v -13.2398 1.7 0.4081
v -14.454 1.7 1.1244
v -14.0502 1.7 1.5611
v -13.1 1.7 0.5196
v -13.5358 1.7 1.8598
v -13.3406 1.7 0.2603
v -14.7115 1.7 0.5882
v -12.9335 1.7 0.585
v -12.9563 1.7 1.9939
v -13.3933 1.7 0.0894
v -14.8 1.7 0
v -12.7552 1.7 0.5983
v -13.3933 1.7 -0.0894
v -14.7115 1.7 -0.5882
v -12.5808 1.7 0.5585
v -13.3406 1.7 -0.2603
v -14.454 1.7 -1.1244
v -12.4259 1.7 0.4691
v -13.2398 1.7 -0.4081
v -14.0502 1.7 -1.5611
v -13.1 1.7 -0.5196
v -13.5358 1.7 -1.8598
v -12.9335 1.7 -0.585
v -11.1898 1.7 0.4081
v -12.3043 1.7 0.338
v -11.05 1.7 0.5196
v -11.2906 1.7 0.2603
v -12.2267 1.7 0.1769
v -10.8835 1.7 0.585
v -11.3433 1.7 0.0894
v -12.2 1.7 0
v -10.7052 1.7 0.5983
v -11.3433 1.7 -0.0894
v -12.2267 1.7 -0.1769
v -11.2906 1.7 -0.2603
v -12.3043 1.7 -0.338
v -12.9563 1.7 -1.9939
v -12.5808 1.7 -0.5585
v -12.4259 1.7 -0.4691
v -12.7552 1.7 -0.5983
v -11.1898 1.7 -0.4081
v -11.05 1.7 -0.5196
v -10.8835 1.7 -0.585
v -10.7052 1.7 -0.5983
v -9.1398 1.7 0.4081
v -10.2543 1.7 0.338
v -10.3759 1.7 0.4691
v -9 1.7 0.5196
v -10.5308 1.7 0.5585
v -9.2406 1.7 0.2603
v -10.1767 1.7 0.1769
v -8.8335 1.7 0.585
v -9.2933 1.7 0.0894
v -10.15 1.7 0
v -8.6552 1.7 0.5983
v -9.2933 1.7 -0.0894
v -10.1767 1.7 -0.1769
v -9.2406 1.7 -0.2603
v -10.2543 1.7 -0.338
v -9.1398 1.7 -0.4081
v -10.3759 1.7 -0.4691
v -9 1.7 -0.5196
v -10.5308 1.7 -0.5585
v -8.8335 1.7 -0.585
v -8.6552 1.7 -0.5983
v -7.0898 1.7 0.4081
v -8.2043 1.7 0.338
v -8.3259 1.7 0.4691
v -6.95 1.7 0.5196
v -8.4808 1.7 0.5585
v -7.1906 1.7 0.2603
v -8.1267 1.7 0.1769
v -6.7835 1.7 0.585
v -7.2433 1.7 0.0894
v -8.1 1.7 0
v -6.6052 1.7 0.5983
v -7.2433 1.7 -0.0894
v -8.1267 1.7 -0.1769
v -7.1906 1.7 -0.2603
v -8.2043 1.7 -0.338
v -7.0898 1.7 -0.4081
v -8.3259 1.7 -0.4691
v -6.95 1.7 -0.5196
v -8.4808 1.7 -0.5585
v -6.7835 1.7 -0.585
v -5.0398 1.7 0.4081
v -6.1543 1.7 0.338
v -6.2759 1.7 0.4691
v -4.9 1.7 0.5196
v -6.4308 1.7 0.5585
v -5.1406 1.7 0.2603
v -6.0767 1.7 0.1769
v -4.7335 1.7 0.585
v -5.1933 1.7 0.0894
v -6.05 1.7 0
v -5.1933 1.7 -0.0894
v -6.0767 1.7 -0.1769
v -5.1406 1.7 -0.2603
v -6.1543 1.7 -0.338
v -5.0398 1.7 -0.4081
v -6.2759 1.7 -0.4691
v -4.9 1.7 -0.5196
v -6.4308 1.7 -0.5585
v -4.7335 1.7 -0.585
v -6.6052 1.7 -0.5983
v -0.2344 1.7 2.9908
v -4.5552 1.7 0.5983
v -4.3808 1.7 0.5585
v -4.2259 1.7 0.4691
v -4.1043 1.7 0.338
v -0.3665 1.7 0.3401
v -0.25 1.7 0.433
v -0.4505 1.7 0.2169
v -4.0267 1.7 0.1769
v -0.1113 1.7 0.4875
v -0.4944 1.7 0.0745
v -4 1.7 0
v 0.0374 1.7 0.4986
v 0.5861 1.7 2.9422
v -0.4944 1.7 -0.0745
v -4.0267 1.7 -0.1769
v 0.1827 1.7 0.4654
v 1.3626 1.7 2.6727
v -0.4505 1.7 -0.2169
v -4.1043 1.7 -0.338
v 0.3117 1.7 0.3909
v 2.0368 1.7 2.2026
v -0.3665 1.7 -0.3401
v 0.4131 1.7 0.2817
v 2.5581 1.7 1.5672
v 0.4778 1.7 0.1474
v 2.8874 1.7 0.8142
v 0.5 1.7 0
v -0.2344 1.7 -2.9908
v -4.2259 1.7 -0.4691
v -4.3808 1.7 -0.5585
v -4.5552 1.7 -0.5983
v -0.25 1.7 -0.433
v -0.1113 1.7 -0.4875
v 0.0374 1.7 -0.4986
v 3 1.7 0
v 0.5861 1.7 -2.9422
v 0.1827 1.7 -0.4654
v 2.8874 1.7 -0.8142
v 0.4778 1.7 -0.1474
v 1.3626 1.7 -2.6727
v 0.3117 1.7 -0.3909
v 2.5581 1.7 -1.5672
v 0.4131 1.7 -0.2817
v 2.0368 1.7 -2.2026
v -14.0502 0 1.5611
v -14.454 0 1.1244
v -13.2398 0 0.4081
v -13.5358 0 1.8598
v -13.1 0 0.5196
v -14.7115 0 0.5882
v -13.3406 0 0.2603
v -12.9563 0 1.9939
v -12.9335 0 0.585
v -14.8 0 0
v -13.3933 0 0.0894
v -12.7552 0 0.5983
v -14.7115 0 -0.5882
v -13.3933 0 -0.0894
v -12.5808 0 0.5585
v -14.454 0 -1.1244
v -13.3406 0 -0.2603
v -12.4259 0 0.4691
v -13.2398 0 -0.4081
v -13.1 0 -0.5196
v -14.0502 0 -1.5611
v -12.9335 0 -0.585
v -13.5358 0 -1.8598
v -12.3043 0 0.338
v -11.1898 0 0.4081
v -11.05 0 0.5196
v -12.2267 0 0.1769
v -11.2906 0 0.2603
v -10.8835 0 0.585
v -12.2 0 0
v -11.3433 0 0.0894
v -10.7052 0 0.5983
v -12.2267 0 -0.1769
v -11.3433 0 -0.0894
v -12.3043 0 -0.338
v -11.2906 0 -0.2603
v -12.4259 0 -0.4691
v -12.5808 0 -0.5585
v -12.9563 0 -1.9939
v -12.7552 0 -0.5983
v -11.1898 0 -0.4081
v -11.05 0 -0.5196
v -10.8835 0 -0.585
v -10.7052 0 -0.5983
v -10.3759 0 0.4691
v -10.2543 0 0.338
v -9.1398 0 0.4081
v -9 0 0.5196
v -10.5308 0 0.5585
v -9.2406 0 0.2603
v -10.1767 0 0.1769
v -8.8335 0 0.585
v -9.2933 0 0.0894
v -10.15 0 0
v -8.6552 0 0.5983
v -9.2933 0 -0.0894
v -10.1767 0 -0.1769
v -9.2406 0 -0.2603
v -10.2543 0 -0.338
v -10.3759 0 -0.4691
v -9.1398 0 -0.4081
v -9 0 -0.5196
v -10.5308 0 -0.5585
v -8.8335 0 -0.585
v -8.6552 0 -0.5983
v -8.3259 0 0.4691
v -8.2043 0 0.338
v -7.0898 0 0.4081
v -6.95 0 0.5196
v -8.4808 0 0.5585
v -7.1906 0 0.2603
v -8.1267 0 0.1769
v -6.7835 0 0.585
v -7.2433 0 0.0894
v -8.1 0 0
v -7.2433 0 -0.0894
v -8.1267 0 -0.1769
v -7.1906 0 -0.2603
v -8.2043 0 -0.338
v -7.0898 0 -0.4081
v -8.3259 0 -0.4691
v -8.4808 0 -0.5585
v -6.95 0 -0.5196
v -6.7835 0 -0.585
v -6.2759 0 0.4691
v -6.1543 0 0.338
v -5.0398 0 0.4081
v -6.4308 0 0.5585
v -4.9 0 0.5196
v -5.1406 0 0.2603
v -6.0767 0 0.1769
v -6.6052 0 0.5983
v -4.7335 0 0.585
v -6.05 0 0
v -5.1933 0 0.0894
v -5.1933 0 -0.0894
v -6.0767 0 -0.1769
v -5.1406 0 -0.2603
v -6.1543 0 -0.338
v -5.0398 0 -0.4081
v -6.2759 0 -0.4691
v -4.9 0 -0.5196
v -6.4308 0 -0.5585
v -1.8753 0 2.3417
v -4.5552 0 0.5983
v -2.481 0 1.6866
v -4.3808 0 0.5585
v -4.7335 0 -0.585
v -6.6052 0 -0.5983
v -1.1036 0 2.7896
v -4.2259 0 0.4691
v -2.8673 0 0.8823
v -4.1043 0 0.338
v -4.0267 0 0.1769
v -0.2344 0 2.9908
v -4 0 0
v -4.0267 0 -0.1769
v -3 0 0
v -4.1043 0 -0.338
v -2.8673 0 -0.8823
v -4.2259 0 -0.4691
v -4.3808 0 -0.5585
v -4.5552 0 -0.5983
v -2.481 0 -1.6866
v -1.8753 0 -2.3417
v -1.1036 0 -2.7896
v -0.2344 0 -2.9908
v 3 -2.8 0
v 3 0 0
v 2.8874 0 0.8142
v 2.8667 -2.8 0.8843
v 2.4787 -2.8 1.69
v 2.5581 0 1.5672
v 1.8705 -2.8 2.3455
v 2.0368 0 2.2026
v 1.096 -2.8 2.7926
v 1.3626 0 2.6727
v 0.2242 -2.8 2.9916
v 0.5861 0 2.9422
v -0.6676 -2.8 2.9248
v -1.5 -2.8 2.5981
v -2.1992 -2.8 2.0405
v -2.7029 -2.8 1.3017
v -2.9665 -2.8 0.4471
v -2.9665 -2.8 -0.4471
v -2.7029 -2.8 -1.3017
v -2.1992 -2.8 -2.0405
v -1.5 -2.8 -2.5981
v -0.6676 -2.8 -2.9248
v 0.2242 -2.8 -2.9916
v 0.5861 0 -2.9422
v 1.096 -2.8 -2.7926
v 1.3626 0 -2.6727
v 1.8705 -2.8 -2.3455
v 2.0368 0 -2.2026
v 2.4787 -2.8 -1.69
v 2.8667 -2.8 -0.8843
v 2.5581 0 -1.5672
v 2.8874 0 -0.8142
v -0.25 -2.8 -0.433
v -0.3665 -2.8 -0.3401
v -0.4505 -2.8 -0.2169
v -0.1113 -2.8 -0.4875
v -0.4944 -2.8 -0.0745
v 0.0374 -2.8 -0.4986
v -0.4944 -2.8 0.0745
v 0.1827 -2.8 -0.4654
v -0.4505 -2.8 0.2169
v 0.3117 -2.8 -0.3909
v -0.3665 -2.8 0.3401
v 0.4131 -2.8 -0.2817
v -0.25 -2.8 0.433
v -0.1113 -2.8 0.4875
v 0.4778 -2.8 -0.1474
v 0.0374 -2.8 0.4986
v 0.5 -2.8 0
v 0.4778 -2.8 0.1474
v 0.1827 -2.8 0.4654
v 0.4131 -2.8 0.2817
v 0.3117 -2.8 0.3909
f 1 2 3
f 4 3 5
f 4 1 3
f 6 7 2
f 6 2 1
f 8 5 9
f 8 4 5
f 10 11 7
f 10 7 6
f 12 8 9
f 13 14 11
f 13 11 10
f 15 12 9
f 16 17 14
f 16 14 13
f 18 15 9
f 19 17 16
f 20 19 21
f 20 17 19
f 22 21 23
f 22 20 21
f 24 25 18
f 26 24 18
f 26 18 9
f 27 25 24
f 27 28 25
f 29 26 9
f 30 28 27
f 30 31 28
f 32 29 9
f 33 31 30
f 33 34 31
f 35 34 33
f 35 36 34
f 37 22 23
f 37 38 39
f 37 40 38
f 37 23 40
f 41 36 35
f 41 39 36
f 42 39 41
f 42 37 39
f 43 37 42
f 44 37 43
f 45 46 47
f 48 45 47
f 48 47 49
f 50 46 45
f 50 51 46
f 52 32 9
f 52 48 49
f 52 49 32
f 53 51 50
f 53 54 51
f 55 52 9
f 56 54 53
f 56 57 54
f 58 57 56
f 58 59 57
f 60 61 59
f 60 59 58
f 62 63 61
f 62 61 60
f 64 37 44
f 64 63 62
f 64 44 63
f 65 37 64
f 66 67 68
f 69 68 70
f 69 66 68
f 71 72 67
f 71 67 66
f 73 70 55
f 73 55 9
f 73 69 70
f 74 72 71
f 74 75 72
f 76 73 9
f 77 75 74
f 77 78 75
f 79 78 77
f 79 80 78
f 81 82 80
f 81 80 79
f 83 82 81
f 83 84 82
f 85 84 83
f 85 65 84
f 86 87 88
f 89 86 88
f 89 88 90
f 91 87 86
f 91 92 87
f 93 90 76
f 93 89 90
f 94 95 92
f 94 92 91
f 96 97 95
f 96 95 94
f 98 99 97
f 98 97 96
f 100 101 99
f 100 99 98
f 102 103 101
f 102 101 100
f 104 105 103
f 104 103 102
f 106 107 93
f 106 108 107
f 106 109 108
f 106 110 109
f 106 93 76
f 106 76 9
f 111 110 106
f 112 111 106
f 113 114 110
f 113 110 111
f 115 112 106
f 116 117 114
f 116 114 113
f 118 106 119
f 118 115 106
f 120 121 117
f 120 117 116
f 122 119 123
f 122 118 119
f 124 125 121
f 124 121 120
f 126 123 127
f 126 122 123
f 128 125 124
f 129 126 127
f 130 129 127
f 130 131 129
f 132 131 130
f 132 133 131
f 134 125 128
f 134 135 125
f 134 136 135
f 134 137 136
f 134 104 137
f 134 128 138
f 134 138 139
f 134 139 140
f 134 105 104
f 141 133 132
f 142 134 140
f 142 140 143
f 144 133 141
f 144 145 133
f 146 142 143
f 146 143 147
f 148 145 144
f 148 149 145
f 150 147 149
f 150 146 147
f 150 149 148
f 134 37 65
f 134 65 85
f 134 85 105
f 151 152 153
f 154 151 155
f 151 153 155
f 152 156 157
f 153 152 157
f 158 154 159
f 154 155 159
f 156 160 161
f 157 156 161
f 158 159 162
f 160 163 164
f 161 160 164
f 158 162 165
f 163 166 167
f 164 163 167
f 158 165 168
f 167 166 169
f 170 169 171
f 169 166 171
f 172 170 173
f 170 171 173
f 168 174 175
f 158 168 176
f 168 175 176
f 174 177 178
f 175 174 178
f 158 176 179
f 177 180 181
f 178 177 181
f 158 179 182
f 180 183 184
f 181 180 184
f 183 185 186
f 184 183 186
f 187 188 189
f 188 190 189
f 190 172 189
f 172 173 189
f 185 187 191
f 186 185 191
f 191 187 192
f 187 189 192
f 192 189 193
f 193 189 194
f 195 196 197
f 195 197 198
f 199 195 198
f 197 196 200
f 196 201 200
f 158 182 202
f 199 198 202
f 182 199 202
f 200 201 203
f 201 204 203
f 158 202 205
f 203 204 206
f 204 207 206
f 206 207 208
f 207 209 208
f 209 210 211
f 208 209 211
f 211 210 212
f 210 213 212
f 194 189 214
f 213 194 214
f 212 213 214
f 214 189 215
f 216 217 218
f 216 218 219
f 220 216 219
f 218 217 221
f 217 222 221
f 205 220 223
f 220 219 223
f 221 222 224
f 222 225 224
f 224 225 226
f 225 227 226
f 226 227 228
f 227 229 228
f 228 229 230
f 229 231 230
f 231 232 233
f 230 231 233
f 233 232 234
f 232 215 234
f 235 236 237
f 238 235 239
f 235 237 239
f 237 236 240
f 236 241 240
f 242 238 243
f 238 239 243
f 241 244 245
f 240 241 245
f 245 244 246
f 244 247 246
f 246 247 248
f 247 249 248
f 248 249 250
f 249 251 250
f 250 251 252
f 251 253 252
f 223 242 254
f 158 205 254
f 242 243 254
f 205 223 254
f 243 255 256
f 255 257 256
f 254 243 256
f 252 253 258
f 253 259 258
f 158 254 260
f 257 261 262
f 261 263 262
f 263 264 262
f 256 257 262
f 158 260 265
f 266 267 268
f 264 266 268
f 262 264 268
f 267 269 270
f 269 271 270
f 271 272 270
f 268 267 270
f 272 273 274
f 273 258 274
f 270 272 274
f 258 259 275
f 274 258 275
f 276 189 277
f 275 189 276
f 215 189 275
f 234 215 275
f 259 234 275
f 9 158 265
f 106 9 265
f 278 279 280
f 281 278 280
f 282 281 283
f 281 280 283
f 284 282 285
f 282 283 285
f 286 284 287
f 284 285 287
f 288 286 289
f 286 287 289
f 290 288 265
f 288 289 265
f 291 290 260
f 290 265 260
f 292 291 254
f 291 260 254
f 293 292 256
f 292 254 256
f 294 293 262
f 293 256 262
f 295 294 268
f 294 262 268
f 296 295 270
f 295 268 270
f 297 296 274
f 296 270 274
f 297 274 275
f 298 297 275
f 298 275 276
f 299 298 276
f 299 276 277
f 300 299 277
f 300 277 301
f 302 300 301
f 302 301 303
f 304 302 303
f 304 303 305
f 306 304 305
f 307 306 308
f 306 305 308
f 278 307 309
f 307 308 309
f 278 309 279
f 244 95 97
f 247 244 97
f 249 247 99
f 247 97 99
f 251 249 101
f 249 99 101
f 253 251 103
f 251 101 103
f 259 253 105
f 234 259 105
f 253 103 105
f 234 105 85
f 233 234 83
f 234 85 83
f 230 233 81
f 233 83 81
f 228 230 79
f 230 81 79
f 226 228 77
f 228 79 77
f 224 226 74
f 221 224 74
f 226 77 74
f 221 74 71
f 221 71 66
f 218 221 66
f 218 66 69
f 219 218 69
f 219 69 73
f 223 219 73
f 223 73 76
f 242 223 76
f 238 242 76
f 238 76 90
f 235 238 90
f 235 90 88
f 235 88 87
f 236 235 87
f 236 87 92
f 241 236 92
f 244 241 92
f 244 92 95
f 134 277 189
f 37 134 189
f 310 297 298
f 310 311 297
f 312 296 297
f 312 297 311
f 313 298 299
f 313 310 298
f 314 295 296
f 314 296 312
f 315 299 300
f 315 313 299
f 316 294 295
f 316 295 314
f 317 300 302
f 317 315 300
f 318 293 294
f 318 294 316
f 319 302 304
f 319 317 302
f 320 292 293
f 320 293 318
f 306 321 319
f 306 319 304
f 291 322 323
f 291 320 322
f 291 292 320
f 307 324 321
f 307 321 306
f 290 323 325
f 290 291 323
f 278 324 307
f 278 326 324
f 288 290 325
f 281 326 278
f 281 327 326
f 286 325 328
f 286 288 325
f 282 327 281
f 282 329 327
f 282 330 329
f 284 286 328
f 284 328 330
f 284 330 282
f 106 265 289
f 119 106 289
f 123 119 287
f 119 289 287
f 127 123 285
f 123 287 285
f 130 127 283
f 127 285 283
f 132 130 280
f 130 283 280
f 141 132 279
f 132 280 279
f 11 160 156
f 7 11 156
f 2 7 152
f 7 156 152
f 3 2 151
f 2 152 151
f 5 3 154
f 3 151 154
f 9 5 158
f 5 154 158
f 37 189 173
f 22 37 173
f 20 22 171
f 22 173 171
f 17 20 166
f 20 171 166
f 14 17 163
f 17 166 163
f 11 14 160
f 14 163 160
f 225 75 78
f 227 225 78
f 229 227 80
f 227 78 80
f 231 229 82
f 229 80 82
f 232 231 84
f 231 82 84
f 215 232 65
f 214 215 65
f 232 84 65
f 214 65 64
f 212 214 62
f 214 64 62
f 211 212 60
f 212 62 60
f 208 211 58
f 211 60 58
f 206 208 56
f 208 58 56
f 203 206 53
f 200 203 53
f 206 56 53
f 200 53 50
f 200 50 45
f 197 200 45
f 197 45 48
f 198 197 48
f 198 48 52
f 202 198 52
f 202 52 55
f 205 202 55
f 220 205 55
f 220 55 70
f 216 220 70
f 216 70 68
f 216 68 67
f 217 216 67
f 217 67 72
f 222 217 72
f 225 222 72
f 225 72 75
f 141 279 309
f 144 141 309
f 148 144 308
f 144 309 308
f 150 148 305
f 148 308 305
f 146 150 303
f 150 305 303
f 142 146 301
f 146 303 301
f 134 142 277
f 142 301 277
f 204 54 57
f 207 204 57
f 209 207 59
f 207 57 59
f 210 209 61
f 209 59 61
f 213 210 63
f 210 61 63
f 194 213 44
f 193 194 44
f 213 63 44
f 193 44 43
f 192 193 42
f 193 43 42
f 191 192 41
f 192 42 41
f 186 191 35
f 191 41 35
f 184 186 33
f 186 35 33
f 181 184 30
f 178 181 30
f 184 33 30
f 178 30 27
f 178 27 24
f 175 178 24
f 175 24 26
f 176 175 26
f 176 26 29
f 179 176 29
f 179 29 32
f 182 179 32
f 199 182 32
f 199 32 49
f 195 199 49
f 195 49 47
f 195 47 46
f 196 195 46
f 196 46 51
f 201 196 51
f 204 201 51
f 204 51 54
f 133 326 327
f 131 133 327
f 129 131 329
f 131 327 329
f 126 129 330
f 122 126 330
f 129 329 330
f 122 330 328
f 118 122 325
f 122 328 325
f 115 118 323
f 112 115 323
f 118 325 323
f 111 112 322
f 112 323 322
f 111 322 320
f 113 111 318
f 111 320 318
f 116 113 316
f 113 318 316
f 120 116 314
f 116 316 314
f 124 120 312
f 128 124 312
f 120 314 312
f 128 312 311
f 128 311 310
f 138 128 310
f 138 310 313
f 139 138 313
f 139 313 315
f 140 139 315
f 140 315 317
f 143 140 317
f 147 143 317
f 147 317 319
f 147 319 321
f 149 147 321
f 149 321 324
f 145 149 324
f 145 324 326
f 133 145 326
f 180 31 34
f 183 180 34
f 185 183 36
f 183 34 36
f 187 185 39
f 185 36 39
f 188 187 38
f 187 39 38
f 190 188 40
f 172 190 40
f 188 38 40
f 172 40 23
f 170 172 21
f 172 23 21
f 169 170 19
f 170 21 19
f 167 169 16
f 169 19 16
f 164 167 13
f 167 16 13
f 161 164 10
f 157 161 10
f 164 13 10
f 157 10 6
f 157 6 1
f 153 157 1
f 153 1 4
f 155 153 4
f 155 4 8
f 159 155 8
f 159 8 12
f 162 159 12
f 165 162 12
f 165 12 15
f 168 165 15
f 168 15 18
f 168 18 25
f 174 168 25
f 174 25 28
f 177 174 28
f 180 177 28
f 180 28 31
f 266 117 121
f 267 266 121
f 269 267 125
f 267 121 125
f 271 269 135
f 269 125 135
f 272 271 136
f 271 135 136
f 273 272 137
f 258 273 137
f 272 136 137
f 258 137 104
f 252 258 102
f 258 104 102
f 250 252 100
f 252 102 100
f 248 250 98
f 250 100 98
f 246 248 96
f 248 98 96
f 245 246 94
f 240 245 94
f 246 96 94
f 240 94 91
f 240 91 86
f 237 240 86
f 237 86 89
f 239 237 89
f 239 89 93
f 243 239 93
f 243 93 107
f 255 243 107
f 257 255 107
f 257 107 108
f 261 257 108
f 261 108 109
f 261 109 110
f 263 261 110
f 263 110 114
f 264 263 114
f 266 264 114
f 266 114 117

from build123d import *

# Parameters (mm, degrees)
BOSS_EXTRUDE1_DEPTH = 1.7
SKETCH2_R           = 0.6
CUT_EXTRUDE1_DEPTH  = 2.7
SKETCH3_R           = 3
BOSS_EXTRUDE2_DEPTH = 2.8
SKETCH4_R           = 0.5
CUT_EXTRUDE2_DEPTH  = 5.5


with BuildPart() as part:
    # Sketch1 → Boss-Extrude1 (new body)
    with BuildSketch(Plane(origin=(0, 0, 0), x_dir=(1, 0, 0), z_dir=(0, 1, 0))):
        with BuildLine():
            Line((-3, 0), (-10.8, 0))
            ThreePointArc((-10.8, 0), (-11.442152439, -1.468417516), (-12.95625, -1.993887143))
            Line((-12.95625, -1.993887143), (-0.234375, -2.990830714))
            ThreePointArc((-0.234375, -2.990830714), (-2.202626273, -2.036771342), (-3, 0))
        make_face()
        with BuildLine():
            ThreePointArc((-12.95625, 1.993887143), (-14.268417516, 1.357847561), (-14.8, 0))
            Line((-14.8, 0), (-10.8, 0))
            ThreePointArc((-10.8, 0), (-11.442152439, 1.468417516), (-12.95625, 1.993887143))
        make_face()
        with BuildLine():
            Line((-10.8, 0), (-14.8, 0))
            ThreePointArc((-14.8, 0), (-14.268417516, -1.357847561), (-12.95625, -1.993887143))
            ThreePointArc((-12.95625, -1.993887143), (-11.442152439, -1.468417516), (-10.8, 0))
        make_face()
        with BuildLine():
            ThreePointArc((-12.95625, 1.993887143), (-11.442152439, 1.468417516), (-10.8, 0))
            Line((-10.8, 0), (-3, 0))
            ThreePointArc((-3, 0), (-2.202626273, 2.036771342), (-0.234375, 2.990830714))
            Line((-0.234375, 2.990830714), (-12.95625, 1.993887143))
        make_face()
        with BuildLine():
            ThreePointArc((-0.234375, 2.990830714), (-2.202626273, 2.036771342), (-3, 0))
            Line((-3, 0), (3, 0))
            ThreePointArc((3, 0), (2.036771342, 2.202626273), (-0.234375, 2.990830714))
        make_face()
        with BuildLine():
            Line((3, 0), (-3, 0))
            ThreePointArc((-3, 0), (-2.202626273, -2.036771342), (-0.234375, -2.990830714))
            ThreePointArc((-0.234375, -2.990830714), (2.036771342, -2.202626273), (3, 0))
        make_face()
    extrude(amount=BOSS_EXTRUDE1_DEPTH)

    # Sketch2 → Cut-Extrude1 (cut, through all)
    with BuildSketch(Plane(origin=(0, 1.7, 0), x_dir=(1, 0, 0), z_dir=(0, 1, 0))):
        with Locations((-12.8, 0)):
            Circle(SKETCH2_R)
        with Locations((-10.75, 0)):
            Circle(SKETCH2_R)
        with Locations((-8.7, 0)):
            Circle(SKETCH2_R)
        with Locations((-6.65, 0)):
            Circle(SKETCH2_R)
        with Locations((-4.6, 0)):
            Circle(SKETCH2_R)
    extrude(amount=-CUT_EXTRUDE1_DEPTH, mode=Mode.SUBTRACT)

    # Sketch3 → Boss-Extrude2 (add)
    with BuildSketch(Plane.XZ):
        Circle(SKETCH3_R)
    extrude(amount=BOSS_EXTRUDE2_DEPTH)

    # Sketch4 → Cut-Extrude2 (cut, through all)
    with BuildSketch(Plane.XZ.offset(2.8)):
        Circle(SKETCH4_R)
    extrude(amount=-CUT_EXTRUDE2_DEPTH, mode=Mode.SUBTRACT)


solid = part.part
